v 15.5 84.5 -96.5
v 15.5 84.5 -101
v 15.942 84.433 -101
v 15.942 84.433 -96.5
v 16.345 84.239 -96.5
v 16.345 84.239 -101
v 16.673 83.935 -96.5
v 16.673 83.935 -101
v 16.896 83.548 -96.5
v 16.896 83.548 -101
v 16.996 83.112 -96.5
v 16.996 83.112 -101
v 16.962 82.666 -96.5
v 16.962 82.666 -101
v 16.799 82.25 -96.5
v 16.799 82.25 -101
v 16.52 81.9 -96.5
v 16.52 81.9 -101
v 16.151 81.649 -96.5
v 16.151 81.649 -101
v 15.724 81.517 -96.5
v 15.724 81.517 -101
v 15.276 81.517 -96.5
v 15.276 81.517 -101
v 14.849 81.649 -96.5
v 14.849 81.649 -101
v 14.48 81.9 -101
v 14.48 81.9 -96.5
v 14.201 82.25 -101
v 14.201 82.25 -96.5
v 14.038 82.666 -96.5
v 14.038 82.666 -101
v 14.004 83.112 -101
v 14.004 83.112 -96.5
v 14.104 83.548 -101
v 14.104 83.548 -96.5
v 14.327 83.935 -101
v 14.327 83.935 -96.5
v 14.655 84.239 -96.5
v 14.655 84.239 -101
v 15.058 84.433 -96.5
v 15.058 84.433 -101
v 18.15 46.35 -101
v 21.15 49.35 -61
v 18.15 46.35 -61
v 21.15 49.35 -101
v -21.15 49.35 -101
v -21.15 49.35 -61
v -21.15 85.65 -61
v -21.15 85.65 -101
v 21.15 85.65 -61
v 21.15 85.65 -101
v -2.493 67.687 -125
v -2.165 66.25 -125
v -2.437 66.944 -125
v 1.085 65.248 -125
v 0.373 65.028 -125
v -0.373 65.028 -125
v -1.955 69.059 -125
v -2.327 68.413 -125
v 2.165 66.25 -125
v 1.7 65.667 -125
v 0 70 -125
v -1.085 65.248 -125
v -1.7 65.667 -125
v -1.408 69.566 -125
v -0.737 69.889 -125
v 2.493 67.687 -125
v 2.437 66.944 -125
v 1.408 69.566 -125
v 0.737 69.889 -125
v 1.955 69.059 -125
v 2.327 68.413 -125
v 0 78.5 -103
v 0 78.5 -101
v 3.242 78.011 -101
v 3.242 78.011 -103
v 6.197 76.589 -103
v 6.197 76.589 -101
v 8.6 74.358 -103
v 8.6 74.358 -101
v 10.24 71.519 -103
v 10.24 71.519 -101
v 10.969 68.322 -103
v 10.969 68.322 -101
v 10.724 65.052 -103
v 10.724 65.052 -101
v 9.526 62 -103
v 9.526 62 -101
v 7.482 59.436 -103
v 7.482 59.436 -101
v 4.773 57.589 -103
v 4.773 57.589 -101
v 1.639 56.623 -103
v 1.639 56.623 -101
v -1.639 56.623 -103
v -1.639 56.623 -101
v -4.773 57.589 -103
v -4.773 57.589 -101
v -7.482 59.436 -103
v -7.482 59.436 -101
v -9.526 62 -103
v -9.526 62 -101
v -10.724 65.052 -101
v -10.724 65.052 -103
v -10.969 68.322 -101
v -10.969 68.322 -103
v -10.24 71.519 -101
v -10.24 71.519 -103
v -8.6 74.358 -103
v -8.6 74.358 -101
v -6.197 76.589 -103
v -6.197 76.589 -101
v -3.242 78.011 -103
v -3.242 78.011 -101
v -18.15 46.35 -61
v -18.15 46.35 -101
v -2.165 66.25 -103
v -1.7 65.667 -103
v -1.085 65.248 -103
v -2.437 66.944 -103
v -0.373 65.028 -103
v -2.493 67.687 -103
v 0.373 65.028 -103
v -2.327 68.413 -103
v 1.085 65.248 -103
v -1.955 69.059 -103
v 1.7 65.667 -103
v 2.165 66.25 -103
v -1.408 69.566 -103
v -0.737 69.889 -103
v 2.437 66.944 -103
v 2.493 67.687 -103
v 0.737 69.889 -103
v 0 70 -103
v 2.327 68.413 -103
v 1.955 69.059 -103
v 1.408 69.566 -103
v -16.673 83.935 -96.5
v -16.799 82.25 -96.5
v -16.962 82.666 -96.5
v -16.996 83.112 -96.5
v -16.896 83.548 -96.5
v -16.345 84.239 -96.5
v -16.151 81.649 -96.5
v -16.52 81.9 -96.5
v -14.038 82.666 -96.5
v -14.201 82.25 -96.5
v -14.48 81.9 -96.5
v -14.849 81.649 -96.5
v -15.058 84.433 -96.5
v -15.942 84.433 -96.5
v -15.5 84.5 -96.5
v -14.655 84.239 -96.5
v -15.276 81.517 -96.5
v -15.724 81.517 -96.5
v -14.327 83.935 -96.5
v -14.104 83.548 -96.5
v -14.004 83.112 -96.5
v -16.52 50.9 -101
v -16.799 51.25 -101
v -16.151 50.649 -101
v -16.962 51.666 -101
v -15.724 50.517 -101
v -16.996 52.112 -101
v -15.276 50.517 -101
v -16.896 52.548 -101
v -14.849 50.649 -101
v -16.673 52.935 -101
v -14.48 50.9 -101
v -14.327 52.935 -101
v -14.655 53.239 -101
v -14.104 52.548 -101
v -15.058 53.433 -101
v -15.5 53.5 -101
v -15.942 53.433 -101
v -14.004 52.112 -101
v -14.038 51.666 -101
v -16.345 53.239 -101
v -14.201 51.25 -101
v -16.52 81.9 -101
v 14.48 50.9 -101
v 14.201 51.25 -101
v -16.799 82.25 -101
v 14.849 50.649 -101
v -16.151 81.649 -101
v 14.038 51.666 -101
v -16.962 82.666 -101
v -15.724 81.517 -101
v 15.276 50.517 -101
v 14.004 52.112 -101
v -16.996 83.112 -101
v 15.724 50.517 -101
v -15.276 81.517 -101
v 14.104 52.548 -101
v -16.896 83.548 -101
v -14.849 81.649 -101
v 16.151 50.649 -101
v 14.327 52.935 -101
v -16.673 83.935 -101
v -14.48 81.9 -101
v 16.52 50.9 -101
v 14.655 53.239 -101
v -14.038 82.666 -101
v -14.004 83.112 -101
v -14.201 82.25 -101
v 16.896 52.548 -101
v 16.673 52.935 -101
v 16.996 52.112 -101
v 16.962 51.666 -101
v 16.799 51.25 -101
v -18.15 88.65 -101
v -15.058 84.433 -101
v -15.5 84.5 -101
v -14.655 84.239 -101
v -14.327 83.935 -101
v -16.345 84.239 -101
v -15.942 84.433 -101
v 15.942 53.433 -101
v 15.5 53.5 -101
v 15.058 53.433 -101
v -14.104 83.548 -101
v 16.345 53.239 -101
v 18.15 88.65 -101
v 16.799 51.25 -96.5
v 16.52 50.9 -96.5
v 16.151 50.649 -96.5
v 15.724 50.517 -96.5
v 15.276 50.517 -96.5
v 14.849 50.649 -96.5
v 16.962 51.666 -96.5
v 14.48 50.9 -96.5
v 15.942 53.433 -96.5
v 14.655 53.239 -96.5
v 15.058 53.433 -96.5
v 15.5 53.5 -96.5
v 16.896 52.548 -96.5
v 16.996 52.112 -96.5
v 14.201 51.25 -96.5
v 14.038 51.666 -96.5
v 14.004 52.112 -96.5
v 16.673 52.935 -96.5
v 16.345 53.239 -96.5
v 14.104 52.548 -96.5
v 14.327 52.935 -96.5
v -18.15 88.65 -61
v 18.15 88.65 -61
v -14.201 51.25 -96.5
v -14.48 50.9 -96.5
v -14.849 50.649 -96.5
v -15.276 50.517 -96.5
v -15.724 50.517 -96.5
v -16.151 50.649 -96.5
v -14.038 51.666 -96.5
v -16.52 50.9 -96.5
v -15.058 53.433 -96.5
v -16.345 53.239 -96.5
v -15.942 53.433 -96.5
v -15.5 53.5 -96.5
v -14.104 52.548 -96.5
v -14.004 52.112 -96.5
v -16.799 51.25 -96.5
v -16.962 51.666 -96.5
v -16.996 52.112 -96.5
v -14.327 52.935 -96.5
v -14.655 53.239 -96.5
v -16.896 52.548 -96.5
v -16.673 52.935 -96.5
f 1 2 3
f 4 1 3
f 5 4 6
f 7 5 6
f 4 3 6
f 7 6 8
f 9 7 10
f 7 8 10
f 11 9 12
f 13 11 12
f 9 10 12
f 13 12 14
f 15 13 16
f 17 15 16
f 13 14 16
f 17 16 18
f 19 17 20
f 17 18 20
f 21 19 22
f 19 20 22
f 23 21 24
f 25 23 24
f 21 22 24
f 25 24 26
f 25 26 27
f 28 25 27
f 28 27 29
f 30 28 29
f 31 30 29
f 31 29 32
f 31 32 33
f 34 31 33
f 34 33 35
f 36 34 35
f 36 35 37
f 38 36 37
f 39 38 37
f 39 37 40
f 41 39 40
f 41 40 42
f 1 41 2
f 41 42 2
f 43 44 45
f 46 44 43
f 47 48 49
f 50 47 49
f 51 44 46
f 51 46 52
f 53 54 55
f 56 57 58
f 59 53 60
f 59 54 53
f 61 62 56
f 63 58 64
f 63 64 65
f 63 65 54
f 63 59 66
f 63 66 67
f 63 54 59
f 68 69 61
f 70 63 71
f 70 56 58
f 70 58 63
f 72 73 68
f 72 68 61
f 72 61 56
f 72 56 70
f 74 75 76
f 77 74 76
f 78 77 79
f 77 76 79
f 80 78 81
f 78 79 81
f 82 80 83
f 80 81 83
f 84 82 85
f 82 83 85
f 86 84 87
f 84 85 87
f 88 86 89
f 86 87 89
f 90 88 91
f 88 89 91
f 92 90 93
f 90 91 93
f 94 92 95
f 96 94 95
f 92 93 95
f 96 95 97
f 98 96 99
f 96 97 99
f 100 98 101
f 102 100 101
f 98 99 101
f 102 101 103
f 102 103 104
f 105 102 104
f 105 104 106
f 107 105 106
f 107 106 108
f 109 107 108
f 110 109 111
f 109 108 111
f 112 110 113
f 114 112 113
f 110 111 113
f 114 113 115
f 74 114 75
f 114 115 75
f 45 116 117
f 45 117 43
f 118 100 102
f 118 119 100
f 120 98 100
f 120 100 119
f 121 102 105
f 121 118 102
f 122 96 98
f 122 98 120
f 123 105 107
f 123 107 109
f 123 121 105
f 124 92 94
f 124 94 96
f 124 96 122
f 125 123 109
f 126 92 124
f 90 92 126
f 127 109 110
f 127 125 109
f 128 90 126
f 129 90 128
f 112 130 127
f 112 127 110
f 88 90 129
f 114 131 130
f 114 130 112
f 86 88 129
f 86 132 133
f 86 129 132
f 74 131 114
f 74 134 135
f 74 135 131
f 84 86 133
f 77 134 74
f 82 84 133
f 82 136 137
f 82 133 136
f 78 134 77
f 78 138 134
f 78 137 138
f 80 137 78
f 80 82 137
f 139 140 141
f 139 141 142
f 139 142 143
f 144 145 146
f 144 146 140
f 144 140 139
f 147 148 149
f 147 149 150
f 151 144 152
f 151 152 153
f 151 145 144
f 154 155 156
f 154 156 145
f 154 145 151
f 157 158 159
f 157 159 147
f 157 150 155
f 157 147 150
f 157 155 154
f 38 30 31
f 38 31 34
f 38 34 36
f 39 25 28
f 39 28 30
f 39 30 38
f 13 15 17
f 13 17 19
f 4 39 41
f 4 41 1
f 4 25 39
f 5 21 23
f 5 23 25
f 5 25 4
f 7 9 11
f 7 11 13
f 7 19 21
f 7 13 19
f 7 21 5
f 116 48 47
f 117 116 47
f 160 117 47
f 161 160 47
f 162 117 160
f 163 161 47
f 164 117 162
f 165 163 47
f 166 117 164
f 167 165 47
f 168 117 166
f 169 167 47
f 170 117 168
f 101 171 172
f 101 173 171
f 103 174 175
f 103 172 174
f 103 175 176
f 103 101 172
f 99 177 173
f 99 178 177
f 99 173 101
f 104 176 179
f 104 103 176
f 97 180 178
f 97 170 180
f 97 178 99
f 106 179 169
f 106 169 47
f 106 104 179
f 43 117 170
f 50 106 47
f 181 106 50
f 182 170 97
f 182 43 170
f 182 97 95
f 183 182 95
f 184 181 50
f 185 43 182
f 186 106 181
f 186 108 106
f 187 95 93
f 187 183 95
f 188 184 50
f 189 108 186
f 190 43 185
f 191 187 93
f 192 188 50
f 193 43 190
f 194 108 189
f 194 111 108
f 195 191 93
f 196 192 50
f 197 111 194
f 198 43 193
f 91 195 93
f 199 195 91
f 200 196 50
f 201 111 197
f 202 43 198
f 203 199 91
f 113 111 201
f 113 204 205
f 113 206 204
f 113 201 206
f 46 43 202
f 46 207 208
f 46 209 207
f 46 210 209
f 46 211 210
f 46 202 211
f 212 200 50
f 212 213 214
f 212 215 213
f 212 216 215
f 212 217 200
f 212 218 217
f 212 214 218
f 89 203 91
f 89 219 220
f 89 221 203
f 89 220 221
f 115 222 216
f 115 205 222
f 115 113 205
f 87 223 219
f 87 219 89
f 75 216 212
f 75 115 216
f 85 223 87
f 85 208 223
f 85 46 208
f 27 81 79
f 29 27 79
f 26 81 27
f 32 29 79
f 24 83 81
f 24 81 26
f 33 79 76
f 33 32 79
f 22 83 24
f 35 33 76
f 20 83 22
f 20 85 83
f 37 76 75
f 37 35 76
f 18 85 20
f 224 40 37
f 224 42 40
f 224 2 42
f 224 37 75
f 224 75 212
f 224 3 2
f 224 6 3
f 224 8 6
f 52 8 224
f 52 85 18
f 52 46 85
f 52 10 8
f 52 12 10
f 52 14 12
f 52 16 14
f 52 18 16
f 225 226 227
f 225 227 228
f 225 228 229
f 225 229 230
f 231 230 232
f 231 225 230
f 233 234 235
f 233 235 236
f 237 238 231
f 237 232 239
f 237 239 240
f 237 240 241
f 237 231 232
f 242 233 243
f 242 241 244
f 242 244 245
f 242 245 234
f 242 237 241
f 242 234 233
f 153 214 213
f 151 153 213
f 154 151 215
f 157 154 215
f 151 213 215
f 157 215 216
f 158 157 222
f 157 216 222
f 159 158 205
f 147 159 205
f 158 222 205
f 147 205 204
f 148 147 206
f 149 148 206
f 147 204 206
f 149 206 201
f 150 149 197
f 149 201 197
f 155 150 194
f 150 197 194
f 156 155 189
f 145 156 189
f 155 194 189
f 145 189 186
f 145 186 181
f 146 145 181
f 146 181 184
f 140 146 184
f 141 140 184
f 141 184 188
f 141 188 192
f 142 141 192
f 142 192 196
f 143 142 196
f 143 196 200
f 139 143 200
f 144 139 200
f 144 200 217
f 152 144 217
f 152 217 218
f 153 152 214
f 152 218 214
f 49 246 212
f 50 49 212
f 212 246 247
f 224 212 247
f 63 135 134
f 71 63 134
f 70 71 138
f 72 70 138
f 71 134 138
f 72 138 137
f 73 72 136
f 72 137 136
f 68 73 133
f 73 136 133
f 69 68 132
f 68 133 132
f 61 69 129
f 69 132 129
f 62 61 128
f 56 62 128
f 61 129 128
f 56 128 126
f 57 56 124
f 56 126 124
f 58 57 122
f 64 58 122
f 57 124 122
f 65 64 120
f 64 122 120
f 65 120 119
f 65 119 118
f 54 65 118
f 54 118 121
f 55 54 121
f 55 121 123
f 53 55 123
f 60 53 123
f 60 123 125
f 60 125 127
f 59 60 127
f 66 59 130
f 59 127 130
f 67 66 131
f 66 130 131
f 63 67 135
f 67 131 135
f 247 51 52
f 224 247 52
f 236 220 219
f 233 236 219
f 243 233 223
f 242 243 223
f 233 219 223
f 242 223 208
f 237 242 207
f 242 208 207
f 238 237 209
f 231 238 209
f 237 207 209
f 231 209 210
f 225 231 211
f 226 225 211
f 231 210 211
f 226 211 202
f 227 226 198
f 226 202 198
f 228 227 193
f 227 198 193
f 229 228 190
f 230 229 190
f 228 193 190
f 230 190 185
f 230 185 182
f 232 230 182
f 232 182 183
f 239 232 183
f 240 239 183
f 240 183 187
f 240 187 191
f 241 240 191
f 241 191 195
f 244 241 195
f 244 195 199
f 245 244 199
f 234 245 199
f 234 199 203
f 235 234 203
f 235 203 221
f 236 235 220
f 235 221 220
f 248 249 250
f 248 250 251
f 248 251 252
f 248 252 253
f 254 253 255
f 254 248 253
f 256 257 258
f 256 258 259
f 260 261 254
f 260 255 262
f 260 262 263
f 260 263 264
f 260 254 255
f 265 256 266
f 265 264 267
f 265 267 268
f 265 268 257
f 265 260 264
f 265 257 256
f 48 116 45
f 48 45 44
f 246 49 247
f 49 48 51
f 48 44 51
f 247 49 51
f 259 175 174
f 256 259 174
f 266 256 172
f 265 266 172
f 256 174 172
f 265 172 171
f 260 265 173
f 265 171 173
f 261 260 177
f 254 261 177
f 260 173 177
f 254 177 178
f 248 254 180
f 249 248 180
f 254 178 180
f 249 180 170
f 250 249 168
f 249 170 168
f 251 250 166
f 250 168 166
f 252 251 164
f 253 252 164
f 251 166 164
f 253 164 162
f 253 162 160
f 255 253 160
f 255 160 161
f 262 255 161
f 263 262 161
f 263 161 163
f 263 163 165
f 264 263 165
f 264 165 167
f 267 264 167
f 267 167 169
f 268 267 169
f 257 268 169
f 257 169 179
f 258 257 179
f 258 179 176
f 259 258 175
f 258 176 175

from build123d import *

# Parameters (mm, degrees)
SKETCH074_W             = 42.3
SKETCH074_H             = 42.3
PAD032_DEPTH            = 40
CHAMFER010_SIZE         = 3
SKETCH075_R             = 1.5
POCKET011_DEPTH         = 4.5
SKETCH076_R             = 11
PAD033_DEPTH            = 2
SKETCH077_R             = 2.5
PAD034_DEPTH            = 22
BODY017_ROLL_ANGLE      = 180
BODY017_PLACEMENT_ANGLE = 90


with BuildPart() as part:
    # Sketch074 → Pad032 (new body)
    with BuildSketch(Plane.XY):
        Rectangle(SKETCH074_W, SKETCH074_H)
    extrude(amount=PAD032_DEPTH)

    # Chamfer010
    chamfer010_edges = [part.edges().sort_by_distance(p)[0] for p in [
        (-21.15, -21.15, 20),
        (21.15, -21.15, 20),
        (21.15, 21.15, 20),
        (-21.15, 21.15, 20),
    ]]
    chamfer(chamfer010_edges, length=CHAMFER010_SIZE)

    # Sketch075 (on Face5 of Chamfer010) → Pocket011 (cut)
    with BuildSketch(Plane.XY.offset(40)):
        with Locations((15.5, -15.5)):
            Circle(SKETCH075_R)
        with Locations((-15.5, -15.5)):
            Circle(SKETCH075_R)
        with Locations((-15.5, 15.5)):
            Circle(SKETCH075_R)
        with Locations((15.5, 15.5)):
            Circle(SKETCH075_R)
    extrude(amount=-POCKET011_DEPTH, mode=Mode.SUBTRACT)

    # Sketch076 (on Face5 of Pocket011) → Pad033 (join)
    with BuildSketch(Plane.XY.offset(40)):
        Circle(SKETCH076_R)
    extrude(amount=PAD033_DEPTH)

    # Sketch077 (on Face19 of Pad033) → Pad034 (join)
    with BuildSketch(Plane.XY.offset(42)):
        Circle(SKETCH077_R)
    extrude(amount=PAD034_DEPTH)


with BuildPart() as part_1:
    # Body017 roll: moved
    add(part.part.rotate(Axis((0, 0, 0), (1, 0, 0)), BODY017_ROLL_ANGLE))


with BuildPart() as part_2:
    # Body017 placement: moved
    add(part_1.part.moved(Location((0, 67.5, -61))).rotate(Axis((0, 67.5, -61), (0, 0, 1)), BODY017_PLACEMENT_ANGLE))


solid = part_2.part
